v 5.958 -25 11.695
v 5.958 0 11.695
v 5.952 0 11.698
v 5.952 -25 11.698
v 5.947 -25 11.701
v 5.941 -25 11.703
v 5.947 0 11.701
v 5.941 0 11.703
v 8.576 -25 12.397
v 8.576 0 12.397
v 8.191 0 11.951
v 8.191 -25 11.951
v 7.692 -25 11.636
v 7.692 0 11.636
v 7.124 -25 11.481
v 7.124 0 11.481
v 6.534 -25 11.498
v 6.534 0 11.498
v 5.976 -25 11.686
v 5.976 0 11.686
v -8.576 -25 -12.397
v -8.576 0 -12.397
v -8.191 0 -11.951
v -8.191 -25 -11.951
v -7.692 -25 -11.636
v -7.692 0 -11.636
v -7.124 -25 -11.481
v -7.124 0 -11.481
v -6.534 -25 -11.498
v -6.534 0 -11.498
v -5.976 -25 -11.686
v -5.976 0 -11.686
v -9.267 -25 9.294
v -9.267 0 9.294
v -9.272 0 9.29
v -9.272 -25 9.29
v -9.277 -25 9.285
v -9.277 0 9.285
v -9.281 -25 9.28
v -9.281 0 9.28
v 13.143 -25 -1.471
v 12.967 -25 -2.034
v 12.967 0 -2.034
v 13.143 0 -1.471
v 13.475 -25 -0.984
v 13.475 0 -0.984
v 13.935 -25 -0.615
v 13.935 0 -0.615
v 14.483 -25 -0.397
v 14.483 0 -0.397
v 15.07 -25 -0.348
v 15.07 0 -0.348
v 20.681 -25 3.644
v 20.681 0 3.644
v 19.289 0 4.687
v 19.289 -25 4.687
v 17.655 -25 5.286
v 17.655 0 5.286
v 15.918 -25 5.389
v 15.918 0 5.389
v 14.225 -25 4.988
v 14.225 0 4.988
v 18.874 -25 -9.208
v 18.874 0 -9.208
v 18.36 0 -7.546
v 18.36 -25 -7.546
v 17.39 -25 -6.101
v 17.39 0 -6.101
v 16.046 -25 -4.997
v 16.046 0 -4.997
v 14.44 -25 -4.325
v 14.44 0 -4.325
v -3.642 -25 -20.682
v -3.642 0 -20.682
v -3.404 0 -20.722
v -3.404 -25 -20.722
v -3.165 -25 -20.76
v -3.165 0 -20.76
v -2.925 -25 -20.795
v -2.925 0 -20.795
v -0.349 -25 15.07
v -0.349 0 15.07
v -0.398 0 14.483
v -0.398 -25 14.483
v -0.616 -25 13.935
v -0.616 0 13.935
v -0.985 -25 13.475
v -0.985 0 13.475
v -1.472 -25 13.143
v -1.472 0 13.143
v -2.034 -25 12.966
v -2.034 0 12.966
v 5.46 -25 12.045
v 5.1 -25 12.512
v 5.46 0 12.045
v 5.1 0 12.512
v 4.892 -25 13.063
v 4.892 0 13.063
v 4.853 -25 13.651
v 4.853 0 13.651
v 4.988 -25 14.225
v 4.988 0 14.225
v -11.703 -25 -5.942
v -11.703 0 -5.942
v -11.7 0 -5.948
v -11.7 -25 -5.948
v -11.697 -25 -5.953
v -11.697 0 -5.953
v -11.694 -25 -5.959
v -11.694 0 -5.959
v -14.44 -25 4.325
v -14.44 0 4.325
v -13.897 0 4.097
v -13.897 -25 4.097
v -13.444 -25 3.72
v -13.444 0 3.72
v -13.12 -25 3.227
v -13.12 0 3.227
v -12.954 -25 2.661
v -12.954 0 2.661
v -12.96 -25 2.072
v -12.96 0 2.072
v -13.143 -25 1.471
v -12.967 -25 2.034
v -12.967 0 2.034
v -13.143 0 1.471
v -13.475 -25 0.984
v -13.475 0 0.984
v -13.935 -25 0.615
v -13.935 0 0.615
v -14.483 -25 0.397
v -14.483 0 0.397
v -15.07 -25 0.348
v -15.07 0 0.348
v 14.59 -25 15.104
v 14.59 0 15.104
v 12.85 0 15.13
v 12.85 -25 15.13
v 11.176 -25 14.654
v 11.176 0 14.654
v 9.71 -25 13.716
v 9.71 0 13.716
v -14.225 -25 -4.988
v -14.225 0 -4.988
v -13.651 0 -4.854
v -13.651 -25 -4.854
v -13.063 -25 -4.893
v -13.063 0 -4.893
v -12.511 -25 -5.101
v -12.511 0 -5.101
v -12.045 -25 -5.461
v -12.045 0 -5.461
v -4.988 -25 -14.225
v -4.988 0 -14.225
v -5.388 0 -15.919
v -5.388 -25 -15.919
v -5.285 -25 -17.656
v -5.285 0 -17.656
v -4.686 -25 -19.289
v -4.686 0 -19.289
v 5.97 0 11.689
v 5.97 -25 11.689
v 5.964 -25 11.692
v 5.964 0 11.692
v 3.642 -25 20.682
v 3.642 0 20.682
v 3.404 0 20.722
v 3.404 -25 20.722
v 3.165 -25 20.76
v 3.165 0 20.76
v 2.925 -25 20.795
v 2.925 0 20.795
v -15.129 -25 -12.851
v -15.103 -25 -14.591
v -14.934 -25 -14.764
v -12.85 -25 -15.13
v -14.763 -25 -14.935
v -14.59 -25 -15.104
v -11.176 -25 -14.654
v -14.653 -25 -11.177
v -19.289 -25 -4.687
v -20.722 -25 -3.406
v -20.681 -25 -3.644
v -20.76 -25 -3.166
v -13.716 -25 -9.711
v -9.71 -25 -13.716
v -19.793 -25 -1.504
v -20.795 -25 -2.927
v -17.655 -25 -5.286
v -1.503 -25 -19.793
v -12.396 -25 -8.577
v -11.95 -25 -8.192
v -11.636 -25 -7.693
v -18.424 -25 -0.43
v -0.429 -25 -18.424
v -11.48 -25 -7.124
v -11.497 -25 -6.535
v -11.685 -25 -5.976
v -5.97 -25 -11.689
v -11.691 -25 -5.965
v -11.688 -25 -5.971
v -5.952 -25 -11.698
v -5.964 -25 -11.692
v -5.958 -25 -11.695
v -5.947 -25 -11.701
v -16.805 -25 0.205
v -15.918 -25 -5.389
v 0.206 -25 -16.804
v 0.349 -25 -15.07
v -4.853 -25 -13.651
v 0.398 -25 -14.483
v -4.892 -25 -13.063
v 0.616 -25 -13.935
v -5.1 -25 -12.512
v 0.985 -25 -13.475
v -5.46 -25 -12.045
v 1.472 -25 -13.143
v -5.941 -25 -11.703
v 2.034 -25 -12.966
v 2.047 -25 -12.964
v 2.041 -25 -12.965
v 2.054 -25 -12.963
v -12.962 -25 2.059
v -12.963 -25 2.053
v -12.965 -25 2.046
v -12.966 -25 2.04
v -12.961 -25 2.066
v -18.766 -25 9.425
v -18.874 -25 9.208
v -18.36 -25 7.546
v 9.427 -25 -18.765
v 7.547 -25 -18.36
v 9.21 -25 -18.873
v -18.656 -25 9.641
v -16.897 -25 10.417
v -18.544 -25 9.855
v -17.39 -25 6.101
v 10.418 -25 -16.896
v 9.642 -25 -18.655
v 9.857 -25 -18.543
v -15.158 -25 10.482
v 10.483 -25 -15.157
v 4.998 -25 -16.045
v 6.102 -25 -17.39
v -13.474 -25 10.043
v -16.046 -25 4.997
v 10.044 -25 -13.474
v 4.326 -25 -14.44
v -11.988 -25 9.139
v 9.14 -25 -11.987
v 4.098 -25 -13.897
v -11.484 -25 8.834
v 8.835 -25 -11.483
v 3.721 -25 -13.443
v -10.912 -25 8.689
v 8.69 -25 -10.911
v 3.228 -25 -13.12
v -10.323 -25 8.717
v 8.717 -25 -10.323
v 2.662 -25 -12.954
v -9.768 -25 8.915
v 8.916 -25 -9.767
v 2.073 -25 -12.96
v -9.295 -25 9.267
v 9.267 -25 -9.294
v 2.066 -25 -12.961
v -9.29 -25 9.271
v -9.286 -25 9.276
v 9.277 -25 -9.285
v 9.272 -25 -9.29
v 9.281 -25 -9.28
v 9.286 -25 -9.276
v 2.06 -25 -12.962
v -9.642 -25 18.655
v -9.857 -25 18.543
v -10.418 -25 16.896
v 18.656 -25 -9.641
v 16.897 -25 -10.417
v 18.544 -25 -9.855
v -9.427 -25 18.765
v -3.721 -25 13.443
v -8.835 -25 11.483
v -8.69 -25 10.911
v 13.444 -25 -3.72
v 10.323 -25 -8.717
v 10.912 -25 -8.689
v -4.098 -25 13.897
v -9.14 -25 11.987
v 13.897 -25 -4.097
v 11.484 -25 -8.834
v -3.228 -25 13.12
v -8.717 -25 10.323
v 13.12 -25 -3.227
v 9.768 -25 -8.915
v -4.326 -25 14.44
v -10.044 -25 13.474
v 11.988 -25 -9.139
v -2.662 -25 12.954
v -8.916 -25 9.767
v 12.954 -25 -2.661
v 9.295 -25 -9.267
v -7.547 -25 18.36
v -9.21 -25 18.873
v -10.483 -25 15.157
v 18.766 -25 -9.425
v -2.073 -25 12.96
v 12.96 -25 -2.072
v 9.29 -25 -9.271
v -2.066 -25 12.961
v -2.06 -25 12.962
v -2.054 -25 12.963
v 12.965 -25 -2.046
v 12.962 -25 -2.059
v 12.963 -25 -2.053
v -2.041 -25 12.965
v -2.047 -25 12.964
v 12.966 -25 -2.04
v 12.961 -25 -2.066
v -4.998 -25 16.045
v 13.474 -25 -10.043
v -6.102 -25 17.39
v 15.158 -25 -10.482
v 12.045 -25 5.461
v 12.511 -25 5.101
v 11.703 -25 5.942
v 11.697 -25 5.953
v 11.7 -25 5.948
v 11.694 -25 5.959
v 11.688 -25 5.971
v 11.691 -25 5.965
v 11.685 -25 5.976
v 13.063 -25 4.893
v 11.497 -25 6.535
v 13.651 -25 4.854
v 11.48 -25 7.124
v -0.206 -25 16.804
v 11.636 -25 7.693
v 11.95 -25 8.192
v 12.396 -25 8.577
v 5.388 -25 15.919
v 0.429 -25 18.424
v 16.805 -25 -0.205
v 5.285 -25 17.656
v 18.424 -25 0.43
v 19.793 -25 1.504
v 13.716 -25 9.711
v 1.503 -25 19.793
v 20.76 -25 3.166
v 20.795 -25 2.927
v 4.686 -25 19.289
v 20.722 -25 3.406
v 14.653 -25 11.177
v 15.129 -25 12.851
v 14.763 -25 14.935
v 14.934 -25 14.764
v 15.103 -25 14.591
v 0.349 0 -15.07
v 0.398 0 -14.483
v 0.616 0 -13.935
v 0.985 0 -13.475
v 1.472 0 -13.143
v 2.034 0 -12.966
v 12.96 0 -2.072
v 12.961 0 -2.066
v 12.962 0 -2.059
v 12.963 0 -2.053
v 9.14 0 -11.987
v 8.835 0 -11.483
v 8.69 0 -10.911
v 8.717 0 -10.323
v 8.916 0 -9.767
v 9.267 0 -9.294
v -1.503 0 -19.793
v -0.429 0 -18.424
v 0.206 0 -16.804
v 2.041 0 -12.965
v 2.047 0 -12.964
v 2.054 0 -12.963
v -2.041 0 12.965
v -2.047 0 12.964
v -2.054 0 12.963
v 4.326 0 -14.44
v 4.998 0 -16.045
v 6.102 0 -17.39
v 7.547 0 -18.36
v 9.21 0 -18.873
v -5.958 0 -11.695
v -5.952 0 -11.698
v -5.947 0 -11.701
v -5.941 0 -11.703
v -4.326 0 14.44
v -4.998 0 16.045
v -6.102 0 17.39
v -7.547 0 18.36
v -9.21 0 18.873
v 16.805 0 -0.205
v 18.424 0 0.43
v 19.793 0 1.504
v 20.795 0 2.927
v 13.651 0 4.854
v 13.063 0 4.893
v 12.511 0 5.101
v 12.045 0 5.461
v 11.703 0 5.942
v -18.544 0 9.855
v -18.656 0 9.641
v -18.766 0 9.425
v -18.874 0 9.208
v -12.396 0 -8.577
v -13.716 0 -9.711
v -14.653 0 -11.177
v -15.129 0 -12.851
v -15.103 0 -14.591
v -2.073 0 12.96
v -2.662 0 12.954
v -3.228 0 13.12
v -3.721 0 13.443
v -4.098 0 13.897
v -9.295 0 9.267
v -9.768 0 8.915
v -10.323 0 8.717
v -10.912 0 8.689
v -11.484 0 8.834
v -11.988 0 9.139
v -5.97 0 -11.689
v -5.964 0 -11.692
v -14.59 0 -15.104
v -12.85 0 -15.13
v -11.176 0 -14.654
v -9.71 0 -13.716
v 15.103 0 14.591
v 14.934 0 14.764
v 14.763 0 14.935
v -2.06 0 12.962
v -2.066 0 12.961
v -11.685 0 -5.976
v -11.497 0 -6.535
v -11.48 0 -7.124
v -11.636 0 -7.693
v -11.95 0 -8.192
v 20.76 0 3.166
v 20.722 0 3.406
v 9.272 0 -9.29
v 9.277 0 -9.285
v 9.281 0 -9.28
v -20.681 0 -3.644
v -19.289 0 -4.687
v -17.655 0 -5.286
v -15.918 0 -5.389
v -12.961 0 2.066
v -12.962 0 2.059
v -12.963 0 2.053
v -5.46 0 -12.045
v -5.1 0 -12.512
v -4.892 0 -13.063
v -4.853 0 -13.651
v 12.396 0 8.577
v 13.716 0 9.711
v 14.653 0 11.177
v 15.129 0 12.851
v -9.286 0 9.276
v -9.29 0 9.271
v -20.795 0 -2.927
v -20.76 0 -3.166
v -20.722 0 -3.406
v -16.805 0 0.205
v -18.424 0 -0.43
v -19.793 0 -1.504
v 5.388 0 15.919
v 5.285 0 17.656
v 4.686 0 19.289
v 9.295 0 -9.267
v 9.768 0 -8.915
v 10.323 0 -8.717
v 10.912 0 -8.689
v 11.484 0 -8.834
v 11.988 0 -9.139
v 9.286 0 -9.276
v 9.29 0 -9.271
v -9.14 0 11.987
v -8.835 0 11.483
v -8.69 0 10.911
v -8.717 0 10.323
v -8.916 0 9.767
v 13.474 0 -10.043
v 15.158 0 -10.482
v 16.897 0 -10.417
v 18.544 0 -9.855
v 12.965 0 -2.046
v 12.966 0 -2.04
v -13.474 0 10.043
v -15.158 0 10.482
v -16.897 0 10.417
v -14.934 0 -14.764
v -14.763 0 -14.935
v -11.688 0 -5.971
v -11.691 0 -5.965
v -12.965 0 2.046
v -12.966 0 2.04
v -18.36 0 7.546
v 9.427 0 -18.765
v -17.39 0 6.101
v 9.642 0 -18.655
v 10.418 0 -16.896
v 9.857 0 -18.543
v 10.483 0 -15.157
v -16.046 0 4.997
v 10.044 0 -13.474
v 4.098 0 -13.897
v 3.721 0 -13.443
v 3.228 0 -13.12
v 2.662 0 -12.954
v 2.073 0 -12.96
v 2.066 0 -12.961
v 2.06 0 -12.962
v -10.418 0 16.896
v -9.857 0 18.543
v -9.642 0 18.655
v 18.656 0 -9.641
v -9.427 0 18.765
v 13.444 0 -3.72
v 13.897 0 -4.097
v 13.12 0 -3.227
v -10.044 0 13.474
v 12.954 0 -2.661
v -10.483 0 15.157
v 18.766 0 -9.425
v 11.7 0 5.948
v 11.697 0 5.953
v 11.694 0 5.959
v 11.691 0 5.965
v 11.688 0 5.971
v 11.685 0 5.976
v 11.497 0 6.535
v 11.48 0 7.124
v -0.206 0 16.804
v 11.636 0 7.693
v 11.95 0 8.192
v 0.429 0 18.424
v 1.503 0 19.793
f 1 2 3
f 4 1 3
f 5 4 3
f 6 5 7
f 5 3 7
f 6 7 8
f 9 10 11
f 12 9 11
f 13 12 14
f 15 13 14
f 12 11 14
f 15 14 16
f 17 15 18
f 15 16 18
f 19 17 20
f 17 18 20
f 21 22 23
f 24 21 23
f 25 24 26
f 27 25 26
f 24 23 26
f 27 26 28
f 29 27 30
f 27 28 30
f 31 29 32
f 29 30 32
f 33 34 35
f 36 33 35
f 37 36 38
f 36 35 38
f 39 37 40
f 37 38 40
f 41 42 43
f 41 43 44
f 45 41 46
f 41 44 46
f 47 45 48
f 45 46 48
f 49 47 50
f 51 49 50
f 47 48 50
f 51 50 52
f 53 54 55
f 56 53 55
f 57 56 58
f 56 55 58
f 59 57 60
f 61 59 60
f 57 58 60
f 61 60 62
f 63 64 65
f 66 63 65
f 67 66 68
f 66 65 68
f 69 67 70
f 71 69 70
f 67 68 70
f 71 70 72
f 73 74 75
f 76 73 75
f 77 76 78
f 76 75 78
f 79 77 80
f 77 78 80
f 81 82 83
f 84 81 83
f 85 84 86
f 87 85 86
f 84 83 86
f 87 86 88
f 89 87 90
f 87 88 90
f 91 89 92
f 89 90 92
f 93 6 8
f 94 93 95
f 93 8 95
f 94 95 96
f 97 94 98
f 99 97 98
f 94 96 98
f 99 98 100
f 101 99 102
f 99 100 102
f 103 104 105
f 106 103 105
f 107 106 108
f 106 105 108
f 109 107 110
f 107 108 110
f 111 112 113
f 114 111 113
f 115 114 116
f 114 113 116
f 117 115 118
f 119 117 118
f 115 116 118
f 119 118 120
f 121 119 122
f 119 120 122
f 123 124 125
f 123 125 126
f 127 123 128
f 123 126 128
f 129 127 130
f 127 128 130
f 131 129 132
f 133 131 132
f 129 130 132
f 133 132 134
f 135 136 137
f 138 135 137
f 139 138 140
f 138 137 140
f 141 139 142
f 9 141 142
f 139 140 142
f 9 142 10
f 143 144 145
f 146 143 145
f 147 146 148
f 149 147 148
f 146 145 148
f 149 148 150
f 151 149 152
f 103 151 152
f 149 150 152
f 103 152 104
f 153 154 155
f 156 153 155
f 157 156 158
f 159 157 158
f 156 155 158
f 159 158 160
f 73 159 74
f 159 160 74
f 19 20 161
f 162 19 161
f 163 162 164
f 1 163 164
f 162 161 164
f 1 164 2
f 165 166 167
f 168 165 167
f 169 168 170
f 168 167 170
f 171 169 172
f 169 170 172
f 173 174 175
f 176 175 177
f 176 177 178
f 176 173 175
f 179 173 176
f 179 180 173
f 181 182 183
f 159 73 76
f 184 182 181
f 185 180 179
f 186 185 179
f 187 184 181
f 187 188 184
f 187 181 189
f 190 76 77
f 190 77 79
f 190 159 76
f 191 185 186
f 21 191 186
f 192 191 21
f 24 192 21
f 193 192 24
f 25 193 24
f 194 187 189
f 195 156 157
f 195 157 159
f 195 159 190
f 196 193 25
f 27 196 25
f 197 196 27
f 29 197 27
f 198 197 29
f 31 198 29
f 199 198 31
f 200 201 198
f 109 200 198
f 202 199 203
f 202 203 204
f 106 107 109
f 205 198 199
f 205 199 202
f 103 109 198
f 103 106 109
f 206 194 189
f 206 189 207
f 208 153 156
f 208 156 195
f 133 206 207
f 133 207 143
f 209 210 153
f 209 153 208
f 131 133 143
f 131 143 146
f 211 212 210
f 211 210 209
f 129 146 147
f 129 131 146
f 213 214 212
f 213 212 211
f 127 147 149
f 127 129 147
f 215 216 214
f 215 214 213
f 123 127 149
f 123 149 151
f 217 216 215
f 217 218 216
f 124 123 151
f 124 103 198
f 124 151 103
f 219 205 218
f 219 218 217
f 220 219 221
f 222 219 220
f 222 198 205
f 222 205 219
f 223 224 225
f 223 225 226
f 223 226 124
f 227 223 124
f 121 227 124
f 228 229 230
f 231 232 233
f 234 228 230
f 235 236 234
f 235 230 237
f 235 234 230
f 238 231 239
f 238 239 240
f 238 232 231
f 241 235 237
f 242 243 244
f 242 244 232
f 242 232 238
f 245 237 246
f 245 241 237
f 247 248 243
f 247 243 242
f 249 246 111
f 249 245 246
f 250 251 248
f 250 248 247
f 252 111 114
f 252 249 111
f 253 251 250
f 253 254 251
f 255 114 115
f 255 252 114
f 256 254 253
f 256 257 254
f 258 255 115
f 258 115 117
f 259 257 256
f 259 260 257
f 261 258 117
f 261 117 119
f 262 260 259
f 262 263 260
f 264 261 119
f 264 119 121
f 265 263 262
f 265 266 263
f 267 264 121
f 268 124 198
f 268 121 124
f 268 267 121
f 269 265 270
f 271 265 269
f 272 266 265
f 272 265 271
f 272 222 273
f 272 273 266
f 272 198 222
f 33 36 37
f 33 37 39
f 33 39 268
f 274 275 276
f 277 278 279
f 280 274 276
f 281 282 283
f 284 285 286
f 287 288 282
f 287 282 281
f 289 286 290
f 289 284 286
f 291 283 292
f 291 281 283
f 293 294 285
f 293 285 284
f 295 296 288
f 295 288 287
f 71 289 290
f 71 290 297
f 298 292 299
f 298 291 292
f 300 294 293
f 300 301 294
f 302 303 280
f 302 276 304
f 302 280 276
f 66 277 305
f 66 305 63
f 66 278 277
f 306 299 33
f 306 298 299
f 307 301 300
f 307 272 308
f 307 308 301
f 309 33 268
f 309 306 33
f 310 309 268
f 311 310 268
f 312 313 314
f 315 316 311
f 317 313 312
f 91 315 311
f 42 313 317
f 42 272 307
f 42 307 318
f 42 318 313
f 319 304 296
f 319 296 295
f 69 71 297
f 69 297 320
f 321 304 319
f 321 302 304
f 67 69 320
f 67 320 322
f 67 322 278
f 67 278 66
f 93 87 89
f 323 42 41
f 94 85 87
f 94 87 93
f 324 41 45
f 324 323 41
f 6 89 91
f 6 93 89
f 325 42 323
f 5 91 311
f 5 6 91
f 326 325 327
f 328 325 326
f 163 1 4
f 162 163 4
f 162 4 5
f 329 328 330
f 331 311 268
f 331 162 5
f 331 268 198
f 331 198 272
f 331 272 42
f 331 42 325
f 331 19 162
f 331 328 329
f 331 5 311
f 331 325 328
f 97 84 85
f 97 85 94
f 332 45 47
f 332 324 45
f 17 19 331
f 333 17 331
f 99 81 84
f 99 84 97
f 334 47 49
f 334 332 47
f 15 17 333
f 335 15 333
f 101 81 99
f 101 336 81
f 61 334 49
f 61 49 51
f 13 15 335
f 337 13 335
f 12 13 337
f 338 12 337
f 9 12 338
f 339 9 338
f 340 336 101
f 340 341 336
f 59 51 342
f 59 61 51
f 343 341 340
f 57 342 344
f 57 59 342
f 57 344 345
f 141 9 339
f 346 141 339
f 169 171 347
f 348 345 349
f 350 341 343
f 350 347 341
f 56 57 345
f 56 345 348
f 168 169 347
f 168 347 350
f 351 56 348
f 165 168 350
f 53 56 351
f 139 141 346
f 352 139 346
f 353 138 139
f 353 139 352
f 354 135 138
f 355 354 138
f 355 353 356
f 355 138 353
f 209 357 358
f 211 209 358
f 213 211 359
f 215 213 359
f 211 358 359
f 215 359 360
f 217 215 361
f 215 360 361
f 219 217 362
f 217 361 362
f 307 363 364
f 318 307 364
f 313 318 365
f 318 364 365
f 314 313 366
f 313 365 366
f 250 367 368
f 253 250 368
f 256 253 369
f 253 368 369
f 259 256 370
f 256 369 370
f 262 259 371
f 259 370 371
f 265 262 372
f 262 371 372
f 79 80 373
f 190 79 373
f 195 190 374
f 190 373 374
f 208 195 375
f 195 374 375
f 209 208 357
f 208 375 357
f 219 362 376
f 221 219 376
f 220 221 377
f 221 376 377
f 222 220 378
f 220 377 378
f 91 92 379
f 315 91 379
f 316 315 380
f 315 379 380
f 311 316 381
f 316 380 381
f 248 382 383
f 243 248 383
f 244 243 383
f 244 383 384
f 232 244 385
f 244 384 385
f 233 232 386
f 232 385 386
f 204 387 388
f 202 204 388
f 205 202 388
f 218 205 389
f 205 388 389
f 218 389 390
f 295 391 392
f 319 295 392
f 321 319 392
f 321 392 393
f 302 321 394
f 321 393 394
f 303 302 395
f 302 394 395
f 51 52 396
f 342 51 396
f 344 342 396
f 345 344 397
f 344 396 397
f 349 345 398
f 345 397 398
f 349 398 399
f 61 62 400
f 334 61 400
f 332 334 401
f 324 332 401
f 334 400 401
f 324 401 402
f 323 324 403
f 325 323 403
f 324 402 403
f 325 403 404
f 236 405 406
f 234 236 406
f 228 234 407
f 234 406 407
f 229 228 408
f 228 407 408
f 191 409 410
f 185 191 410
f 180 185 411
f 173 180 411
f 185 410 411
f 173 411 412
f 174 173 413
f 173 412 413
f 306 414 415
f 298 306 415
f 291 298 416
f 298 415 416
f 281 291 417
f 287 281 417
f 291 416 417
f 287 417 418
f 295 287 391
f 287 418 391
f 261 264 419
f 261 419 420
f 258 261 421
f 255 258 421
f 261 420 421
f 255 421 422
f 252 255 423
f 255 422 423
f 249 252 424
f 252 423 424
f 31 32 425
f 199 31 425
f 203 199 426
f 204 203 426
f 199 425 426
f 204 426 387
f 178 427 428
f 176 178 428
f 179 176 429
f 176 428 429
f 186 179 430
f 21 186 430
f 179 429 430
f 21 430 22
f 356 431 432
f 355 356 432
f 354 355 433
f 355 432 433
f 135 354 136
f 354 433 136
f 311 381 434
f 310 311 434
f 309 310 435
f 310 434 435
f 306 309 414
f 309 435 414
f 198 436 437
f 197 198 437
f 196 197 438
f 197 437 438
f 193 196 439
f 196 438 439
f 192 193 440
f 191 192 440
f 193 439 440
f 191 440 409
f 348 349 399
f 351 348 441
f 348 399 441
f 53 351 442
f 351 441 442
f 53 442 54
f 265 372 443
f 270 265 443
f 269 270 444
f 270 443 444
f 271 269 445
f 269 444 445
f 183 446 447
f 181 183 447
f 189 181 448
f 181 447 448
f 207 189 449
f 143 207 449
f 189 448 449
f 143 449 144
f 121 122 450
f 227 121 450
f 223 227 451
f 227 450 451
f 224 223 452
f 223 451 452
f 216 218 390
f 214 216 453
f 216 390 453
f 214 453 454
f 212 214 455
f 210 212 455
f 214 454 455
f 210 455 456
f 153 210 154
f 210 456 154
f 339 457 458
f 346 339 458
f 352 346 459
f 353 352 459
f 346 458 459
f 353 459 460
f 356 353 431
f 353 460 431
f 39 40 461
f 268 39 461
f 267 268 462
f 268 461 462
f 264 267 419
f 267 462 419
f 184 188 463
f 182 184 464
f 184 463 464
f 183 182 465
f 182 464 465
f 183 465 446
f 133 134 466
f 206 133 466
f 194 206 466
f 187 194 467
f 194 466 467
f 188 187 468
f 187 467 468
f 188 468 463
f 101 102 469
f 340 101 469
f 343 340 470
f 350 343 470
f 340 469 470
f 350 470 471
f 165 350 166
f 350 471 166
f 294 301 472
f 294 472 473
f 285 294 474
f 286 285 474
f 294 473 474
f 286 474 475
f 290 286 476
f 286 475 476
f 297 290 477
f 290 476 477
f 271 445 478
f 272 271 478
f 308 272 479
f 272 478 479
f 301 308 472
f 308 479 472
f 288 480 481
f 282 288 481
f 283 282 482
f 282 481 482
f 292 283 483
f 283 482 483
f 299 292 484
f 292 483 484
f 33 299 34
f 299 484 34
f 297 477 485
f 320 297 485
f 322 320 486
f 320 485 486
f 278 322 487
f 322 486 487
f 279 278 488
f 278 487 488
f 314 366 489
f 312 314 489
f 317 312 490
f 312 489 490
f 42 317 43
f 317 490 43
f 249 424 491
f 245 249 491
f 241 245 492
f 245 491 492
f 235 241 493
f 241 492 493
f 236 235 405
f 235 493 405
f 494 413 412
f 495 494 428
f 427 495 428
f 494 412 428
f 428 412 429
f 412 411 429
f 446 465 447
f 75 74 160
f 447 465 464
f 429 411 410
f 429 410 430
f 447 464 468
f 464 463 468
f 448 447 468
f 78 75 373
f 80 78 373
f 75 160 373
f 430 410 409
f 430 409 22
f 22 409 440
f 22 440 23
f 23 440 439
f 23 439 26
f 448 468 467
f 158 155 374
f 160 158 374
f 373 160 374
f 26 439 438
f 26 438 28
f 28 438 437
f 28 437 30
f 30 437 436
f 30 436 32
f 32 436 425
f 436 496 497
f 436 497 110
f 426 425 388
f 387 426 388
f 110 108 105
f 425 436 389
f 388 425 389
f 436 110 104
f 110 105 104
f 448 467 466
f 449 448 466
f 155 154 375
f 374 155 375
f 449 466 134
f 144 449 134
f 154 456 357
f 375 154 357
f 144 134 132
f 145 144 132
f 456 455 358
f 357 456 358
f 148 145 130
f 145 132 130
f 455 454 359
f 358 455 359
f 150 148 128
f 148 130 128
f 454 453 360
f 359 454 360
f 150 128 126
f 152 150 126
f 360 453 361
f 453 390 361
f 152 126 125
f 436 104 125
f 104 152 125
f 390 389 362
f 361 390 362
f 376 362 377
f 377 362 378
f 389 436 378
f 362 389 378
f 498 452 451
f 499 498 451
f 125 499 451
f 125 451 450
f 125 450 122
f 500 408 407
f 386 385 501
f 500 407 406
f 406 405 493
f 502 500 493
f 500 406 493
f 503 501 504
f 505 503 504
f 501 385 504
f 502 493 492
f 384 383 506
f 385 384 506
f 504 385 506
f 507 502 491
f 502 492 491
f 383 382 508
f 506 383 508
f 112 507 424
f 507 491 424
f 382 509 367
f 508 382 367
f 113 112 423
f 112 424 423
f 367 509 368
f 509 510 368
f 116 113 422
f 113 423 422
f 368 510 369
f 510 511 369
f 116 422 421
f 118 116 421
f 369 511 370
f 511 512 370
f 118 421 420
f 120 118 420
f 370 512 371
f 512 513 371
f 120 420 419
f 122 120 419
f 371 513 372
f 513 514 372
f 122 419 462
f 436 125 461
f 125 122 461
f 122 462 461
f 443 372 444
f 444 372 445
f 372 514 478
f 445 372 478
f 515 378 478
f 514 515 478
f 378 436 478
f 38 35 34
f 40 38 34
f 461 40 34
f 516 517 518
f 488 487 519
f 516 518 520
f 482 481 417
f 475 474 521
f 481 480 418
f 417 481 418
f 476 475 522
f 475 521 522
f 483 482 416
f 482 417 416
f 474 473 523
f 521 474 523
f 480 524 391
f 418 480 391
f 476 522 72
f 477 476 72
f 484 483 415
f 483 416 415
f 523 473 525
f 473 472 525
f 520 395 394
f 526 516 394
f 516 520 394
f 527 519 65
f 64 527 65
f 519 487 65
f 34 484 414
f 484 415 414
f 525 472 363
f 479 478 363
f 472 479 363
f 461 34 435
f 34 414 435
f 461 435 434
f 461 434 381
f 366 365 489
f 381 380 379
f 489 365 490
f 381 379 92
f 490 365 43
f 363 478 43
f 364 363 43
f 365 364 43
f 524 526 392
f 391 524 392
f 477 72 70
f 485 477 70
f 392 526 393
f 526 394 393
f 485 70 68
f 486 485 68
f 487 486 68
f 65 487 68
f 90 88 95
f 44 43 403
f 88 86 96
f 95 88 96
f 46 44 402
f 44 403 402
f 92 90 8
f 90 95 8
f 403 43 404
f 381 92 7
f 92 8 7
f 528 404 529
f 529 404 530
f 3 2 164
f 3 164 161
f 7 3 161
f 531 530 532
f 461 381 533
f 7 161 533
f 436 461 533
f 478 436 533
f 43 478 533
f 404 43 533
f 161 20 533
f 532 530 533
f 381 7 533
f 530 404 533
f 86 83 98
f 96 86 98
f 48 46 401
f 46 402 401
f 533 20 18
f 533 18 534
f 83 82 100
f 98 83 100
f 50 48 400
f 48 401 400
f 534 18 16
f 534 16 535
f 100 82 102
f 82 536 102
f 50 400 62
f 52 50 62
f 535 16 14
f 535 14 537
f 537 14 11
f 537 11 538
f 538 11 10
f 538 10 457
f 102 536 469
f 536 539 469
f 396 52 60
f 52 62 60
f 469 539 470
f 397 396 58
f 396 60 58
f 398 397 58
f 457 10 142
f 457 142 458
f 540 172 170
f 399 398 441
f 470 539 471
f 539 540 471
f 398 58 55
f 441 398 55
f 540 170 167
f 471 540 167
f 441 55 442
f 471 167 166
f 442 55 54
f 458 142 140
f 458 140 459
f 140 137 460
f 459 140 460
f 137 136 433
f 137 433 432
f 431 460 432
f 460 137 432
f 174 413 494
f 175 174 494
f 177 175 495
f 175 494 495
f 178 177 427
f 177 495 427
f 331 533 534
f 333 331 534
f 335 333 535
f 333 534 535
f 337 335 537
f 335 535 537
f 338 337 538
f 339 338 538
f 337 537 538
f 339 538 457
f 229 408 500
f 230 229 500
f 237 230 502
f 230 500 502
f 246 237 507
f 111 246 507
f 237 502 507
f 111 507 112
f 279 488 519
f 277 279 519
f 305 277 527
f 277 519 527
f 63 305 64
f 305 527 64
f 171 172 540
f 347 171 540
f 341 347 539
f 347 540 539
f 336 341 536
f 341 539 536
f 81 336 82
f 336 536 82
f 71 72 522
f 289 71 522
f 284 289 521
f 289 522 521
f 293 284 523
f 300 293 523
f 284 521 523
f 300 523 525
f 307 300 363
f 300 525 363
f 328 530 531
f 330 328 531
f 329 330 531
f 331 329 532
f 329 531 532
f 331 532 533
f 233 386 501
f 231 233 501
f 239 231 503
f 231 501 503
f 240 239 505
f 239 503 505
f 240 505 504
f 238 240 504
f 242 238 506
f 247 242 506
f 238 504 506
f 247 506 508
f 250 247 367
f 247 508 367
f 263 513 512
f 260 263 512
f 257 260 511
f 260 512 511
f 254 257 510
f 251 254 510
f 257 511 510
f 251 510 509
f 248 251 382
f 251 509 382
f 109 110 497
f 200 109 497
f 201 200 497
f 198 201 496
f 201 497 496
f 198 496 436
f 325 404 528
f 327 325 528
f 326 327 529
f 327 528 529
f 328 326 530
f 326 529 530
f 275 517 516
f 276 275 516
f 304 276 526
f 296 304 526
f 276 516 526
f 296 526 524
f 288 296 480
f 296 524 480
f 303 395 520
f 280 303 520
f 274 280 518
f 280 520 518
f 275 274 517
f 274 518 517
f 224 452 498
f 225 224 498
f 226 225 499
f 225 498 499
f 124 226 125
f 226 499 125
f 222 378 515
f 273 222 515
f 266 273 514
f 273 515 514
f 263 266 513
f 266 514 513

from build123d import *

# Parameters (mm, degrees)
F1_DEPTH = 25


with BuildPart() as f1:
    # F0 (on Front) → F1 (new body)
    with BuildSketch(Plane.XZ):
        with BuildLine():
            ThreePointArc((-0.348561, 15.07019), (-0.783748, 13.691524), (-2.03445, 12.966366))
            ThreePointArc((-2.03445, 12.966366), (-2.044108, 12.964847), (-2.053766, 12.96332))
            ThreePointArc((-2.053766, 12.96332), (-2.063307, 12.961805), (-2.072847, 12.960283))
            ThreePointArc((-2.072847, 12.960283), (-3.48649, 13.263394), (-4.326471, 14.440126))
            ThreePointArc((-4.326471, 14.440126), (-6.102339, 17.389838), (-9.209645, 18.872796))
            ThreePointArc((-9.209645, 18.872796), (-9.534613, 18.710723), (-9.856731, 18.543054))
            ThreePointArc((-9.856731, 18.543054), (-10.48276, 15.157493), (-9.140028, 11.987161))
            ThreePointArc((-9.140028, 11.987161), (-8.681741, 10.616), (-9.267343, 9.294191))
            ThreePointArc((-9.267343, 9.294191), (-9.274264, 9.287285), (-9.28118, 9.280373))
            ThreePointArc((-9.28118, 9.280373), (-9.288008, 9.273539), (-9.294832, 9.2667))
            ThreePointArc((-9.294832, 9.2667), (-10.616657, 8.681004), (-11.987881, 9.139271))
            ThreePointArc((-11.987881, 9.139271), (-15.158386, 10.48181), (-18.54391, 9.85512))
            ThreePointArc((-18.54391, 9.85512), (-18.711551, 9.532987), (-18.873597, 9.208005))
            ThreePointArc((-18.873597, 9.208005), (-17.390082, 6.101058), (-14.440314, 4.325444))
            ThreePointArc((-14.440314, 4.325444), (-13.263604, 3.485525), (-12.960426, 2.071951))
            ThreePointArc((-12.960426, 2.071951), (-12.961966, 2.062295), (-12.963499, 2.052639))
            ThreePointArc((-12.963499, 2.052639), (-12.965006, 2.043097), (-12.966506, 2.033553))
            ThreePointArc((-12.966506, 2.033553), (-13.691622, 0.782765), (-15.070328, 0.347526))
            ThreePointArc((-15.070328, 0.347526), (-18.424445, -0.429914), (-20.795033, -2.926878))
            ThreePointArc((-20.795033, -2.926878), (-20.741312, -3.286025), (-20.68139, -3.64419))
            ThreePointArc((-20.68139, -3.64419), (-17.654983, -5.285774), (-14.224891, -4.988446))
            ThreePointArc((-14.224891, -4.988446), (-12.779221, -4.976302), (-11.703067, -5.941704))
            ThreePointArc((-11.703067, -5.941704), (-11.698638, -5.95042), (-11.694202, -5.959133))
            ThreePointArc((-11.694202, -5.959133), (-11.689812, -5.96774), (-11.685416, -5.976342))
            ThreePointArc((-11.685416, -5.976342), (-11.536853, -7.414464), (-12.396423, -8.576962))
            ThreePointArc((-12.396423, -8.576962), (-14.652992, -11.177425), (-15.103159, -14.590907))
            ThreePointArc((-15.103159, -14.590907), (-14.848597, -14.849888), (-14.589595, -15.104427))
            ThreePointArc((-14.589595, -15.104427), (-11.176282, -14.65362), (-8.576044, -12.396919))
            ThreePointArc((-8.576044, -12.396919), (-7.41361, -11.537351), (-5.975534, -11.68583))
            ThreePointArc((-5.975534, -11.68583), (-5.966827, -11.690278), (-5.958117, -11.69472))
            ThreePointArc((-5.958117, -11.69472), (-5.949507, -11.699102), (-5.940895, -11.703478))
            ThreePointArc((-5.940895, -11.703478), (-4.975398, -12.779619), (-4.987505, -14.225343))
            ThreePointArc((-4.987505, -14.225343), (-5.284594, -17.65554), (-3.642392, -20.681706))
            ThreePointArc((-3.642392, -20.681706), (-3.284223, -20.741598), (-2.925071, -20.795287))
            ThreePointArc((-2.925071, -20.795287), (-0.42862, -18.424281), (0.348561, -15.07019))
            ThreePointArc((0.348561, -15.07019), (0.783748, -13.691524), (2.03445, -12.966366))
            ThreePointArc((2.03445, -12.966366), (2.044108, -12.964847), (2.053766, -12.96332))
            ThreePointArc((2.053766, -12.96332), (2.063307, -12.961805), (2.072847, -12.960283))
            ThreePointArc((2.072847, -12.960283), (3.48649, -13.263394), (4.326471, -14.440126))
            ThreePointArc((4.326471, -14.440126), (6.102339, -17.389838), (9.209645, -18.872796))
            ThreePointArc((9.209645, -18.872796), (9.534613, -18.710723), (9.856731, -18.543054))
            ThreePointArc((9.856731, -18.543054), (10.48276, -15.157493), (9.140028, -11.987161))
            ThreePointArc((9.140028, -11.987161), (8.681741, -10.616), (9.267343, -9.294191))
            ThreePointArc((9.267343, -9.294191), (9.274264, -9.287285), (9.28118, -9.280373))
            ThreePointArc((9.28118, -9.280373), (9.288008, -9.273539), (9.294832, -9.2667))
            ThreePointArc((9.294832, -9.2667), (10.616657, -8.681004), (11.987881, -9.139271))
            ThreePointArc((11.987881, -9.139271), (15.158386, -10.48181), (18.54391, -9.85512))
            ThreePointArc((18.54391, -9.85512), (18.711551, -9.532987), (18.873597, -9.208005))
            ThreePointArc((18.873597, -9.208005), (17.390082, -6.101058), (14.440314, -4.325444))
            ThreePointArc((14.440314, -4.325444), (13.263604, -3.485525), (12.960426, -2.071951))
            ThreePointArc((12.960426, -2.071951), (12.961966, -2.062295), (12.963499, -2.052639))
            ThreePointArc((12.963499, -2.052639), (12.965006, -2.043097), (12.966506, -2.033553))
            ThreePointArc((12.966506, -2.033553), (13.691622, -0.782765), (15.070328, -0.347526))
            ThreePointArc((15.070328, -0.347526), (18.424445, 0.429914), (20.795033, 2.926878))
            ThreePointArc((20.795033, 2.926878), (20.741312, 3.286025), (20.68139, 3.64419))
            ThreePointArc((20.68139, 3.64419), (17.654983, 5.285774), (14.224891, 4.988446))
            ThreePointArc((14.224891, 4.988446), (12.779221, 4.976302), (11.703067, 5.941704))
            ThreePointArc((11.703067, 5.941704), (11.698638, 5.95042), (11.694202, 5.959133))
            ThreePointArc((11.694202, 5.959133), (11.689812, 5.96774), (11.685416, 5.976342))
            ThreePointArc((11.685416, 5.976342), (11.536853, 7.414464), (12.396423, 8.576962))
            ThreePointArc((12.396423, 8.576962), (14.652992, 11.177425), (15.103159, 14.590907))
            ThreePointArc((15.103159, 14.590907), (14.848597, 14.849888), (14.589595, 15.104427))
            ThreePointArc((14.589595, 15.104427), (11.176282, 14.65362), (8.576044, 12.396919))
            ThreePointArc((8.576044, 12.396919), (7.41361, 11.537351), (5.975534, 11.68583))
            ThreePointArc((5.975534, 11.68583), (5.966827, 11.690278), (5.958117, 11.69472))
            ThreePointArc((5.958117, 11.69472), (5.949507, 11.699102), (5.940895, 11.703478))
            ThreePointArc((5.940895, 11.703478), (4.975398, 12.779619), (4.987505, 14.225343))
            ThreePointArc((4.987505, 14.225343), (5.284594, 17.65554), (3.642392, 20.681706))
            ThreePointArc((3.642392, 20.681706), (3.284223, 20.741598), (2.925071, 20.795287))
            ThreePointArc((2.925071, 20.795287), (0.42862, 18.424281), (-0.348561, 15.07019))
        make_face()
    extrude(amount=F1_DEPTH)


solid = f1.part
